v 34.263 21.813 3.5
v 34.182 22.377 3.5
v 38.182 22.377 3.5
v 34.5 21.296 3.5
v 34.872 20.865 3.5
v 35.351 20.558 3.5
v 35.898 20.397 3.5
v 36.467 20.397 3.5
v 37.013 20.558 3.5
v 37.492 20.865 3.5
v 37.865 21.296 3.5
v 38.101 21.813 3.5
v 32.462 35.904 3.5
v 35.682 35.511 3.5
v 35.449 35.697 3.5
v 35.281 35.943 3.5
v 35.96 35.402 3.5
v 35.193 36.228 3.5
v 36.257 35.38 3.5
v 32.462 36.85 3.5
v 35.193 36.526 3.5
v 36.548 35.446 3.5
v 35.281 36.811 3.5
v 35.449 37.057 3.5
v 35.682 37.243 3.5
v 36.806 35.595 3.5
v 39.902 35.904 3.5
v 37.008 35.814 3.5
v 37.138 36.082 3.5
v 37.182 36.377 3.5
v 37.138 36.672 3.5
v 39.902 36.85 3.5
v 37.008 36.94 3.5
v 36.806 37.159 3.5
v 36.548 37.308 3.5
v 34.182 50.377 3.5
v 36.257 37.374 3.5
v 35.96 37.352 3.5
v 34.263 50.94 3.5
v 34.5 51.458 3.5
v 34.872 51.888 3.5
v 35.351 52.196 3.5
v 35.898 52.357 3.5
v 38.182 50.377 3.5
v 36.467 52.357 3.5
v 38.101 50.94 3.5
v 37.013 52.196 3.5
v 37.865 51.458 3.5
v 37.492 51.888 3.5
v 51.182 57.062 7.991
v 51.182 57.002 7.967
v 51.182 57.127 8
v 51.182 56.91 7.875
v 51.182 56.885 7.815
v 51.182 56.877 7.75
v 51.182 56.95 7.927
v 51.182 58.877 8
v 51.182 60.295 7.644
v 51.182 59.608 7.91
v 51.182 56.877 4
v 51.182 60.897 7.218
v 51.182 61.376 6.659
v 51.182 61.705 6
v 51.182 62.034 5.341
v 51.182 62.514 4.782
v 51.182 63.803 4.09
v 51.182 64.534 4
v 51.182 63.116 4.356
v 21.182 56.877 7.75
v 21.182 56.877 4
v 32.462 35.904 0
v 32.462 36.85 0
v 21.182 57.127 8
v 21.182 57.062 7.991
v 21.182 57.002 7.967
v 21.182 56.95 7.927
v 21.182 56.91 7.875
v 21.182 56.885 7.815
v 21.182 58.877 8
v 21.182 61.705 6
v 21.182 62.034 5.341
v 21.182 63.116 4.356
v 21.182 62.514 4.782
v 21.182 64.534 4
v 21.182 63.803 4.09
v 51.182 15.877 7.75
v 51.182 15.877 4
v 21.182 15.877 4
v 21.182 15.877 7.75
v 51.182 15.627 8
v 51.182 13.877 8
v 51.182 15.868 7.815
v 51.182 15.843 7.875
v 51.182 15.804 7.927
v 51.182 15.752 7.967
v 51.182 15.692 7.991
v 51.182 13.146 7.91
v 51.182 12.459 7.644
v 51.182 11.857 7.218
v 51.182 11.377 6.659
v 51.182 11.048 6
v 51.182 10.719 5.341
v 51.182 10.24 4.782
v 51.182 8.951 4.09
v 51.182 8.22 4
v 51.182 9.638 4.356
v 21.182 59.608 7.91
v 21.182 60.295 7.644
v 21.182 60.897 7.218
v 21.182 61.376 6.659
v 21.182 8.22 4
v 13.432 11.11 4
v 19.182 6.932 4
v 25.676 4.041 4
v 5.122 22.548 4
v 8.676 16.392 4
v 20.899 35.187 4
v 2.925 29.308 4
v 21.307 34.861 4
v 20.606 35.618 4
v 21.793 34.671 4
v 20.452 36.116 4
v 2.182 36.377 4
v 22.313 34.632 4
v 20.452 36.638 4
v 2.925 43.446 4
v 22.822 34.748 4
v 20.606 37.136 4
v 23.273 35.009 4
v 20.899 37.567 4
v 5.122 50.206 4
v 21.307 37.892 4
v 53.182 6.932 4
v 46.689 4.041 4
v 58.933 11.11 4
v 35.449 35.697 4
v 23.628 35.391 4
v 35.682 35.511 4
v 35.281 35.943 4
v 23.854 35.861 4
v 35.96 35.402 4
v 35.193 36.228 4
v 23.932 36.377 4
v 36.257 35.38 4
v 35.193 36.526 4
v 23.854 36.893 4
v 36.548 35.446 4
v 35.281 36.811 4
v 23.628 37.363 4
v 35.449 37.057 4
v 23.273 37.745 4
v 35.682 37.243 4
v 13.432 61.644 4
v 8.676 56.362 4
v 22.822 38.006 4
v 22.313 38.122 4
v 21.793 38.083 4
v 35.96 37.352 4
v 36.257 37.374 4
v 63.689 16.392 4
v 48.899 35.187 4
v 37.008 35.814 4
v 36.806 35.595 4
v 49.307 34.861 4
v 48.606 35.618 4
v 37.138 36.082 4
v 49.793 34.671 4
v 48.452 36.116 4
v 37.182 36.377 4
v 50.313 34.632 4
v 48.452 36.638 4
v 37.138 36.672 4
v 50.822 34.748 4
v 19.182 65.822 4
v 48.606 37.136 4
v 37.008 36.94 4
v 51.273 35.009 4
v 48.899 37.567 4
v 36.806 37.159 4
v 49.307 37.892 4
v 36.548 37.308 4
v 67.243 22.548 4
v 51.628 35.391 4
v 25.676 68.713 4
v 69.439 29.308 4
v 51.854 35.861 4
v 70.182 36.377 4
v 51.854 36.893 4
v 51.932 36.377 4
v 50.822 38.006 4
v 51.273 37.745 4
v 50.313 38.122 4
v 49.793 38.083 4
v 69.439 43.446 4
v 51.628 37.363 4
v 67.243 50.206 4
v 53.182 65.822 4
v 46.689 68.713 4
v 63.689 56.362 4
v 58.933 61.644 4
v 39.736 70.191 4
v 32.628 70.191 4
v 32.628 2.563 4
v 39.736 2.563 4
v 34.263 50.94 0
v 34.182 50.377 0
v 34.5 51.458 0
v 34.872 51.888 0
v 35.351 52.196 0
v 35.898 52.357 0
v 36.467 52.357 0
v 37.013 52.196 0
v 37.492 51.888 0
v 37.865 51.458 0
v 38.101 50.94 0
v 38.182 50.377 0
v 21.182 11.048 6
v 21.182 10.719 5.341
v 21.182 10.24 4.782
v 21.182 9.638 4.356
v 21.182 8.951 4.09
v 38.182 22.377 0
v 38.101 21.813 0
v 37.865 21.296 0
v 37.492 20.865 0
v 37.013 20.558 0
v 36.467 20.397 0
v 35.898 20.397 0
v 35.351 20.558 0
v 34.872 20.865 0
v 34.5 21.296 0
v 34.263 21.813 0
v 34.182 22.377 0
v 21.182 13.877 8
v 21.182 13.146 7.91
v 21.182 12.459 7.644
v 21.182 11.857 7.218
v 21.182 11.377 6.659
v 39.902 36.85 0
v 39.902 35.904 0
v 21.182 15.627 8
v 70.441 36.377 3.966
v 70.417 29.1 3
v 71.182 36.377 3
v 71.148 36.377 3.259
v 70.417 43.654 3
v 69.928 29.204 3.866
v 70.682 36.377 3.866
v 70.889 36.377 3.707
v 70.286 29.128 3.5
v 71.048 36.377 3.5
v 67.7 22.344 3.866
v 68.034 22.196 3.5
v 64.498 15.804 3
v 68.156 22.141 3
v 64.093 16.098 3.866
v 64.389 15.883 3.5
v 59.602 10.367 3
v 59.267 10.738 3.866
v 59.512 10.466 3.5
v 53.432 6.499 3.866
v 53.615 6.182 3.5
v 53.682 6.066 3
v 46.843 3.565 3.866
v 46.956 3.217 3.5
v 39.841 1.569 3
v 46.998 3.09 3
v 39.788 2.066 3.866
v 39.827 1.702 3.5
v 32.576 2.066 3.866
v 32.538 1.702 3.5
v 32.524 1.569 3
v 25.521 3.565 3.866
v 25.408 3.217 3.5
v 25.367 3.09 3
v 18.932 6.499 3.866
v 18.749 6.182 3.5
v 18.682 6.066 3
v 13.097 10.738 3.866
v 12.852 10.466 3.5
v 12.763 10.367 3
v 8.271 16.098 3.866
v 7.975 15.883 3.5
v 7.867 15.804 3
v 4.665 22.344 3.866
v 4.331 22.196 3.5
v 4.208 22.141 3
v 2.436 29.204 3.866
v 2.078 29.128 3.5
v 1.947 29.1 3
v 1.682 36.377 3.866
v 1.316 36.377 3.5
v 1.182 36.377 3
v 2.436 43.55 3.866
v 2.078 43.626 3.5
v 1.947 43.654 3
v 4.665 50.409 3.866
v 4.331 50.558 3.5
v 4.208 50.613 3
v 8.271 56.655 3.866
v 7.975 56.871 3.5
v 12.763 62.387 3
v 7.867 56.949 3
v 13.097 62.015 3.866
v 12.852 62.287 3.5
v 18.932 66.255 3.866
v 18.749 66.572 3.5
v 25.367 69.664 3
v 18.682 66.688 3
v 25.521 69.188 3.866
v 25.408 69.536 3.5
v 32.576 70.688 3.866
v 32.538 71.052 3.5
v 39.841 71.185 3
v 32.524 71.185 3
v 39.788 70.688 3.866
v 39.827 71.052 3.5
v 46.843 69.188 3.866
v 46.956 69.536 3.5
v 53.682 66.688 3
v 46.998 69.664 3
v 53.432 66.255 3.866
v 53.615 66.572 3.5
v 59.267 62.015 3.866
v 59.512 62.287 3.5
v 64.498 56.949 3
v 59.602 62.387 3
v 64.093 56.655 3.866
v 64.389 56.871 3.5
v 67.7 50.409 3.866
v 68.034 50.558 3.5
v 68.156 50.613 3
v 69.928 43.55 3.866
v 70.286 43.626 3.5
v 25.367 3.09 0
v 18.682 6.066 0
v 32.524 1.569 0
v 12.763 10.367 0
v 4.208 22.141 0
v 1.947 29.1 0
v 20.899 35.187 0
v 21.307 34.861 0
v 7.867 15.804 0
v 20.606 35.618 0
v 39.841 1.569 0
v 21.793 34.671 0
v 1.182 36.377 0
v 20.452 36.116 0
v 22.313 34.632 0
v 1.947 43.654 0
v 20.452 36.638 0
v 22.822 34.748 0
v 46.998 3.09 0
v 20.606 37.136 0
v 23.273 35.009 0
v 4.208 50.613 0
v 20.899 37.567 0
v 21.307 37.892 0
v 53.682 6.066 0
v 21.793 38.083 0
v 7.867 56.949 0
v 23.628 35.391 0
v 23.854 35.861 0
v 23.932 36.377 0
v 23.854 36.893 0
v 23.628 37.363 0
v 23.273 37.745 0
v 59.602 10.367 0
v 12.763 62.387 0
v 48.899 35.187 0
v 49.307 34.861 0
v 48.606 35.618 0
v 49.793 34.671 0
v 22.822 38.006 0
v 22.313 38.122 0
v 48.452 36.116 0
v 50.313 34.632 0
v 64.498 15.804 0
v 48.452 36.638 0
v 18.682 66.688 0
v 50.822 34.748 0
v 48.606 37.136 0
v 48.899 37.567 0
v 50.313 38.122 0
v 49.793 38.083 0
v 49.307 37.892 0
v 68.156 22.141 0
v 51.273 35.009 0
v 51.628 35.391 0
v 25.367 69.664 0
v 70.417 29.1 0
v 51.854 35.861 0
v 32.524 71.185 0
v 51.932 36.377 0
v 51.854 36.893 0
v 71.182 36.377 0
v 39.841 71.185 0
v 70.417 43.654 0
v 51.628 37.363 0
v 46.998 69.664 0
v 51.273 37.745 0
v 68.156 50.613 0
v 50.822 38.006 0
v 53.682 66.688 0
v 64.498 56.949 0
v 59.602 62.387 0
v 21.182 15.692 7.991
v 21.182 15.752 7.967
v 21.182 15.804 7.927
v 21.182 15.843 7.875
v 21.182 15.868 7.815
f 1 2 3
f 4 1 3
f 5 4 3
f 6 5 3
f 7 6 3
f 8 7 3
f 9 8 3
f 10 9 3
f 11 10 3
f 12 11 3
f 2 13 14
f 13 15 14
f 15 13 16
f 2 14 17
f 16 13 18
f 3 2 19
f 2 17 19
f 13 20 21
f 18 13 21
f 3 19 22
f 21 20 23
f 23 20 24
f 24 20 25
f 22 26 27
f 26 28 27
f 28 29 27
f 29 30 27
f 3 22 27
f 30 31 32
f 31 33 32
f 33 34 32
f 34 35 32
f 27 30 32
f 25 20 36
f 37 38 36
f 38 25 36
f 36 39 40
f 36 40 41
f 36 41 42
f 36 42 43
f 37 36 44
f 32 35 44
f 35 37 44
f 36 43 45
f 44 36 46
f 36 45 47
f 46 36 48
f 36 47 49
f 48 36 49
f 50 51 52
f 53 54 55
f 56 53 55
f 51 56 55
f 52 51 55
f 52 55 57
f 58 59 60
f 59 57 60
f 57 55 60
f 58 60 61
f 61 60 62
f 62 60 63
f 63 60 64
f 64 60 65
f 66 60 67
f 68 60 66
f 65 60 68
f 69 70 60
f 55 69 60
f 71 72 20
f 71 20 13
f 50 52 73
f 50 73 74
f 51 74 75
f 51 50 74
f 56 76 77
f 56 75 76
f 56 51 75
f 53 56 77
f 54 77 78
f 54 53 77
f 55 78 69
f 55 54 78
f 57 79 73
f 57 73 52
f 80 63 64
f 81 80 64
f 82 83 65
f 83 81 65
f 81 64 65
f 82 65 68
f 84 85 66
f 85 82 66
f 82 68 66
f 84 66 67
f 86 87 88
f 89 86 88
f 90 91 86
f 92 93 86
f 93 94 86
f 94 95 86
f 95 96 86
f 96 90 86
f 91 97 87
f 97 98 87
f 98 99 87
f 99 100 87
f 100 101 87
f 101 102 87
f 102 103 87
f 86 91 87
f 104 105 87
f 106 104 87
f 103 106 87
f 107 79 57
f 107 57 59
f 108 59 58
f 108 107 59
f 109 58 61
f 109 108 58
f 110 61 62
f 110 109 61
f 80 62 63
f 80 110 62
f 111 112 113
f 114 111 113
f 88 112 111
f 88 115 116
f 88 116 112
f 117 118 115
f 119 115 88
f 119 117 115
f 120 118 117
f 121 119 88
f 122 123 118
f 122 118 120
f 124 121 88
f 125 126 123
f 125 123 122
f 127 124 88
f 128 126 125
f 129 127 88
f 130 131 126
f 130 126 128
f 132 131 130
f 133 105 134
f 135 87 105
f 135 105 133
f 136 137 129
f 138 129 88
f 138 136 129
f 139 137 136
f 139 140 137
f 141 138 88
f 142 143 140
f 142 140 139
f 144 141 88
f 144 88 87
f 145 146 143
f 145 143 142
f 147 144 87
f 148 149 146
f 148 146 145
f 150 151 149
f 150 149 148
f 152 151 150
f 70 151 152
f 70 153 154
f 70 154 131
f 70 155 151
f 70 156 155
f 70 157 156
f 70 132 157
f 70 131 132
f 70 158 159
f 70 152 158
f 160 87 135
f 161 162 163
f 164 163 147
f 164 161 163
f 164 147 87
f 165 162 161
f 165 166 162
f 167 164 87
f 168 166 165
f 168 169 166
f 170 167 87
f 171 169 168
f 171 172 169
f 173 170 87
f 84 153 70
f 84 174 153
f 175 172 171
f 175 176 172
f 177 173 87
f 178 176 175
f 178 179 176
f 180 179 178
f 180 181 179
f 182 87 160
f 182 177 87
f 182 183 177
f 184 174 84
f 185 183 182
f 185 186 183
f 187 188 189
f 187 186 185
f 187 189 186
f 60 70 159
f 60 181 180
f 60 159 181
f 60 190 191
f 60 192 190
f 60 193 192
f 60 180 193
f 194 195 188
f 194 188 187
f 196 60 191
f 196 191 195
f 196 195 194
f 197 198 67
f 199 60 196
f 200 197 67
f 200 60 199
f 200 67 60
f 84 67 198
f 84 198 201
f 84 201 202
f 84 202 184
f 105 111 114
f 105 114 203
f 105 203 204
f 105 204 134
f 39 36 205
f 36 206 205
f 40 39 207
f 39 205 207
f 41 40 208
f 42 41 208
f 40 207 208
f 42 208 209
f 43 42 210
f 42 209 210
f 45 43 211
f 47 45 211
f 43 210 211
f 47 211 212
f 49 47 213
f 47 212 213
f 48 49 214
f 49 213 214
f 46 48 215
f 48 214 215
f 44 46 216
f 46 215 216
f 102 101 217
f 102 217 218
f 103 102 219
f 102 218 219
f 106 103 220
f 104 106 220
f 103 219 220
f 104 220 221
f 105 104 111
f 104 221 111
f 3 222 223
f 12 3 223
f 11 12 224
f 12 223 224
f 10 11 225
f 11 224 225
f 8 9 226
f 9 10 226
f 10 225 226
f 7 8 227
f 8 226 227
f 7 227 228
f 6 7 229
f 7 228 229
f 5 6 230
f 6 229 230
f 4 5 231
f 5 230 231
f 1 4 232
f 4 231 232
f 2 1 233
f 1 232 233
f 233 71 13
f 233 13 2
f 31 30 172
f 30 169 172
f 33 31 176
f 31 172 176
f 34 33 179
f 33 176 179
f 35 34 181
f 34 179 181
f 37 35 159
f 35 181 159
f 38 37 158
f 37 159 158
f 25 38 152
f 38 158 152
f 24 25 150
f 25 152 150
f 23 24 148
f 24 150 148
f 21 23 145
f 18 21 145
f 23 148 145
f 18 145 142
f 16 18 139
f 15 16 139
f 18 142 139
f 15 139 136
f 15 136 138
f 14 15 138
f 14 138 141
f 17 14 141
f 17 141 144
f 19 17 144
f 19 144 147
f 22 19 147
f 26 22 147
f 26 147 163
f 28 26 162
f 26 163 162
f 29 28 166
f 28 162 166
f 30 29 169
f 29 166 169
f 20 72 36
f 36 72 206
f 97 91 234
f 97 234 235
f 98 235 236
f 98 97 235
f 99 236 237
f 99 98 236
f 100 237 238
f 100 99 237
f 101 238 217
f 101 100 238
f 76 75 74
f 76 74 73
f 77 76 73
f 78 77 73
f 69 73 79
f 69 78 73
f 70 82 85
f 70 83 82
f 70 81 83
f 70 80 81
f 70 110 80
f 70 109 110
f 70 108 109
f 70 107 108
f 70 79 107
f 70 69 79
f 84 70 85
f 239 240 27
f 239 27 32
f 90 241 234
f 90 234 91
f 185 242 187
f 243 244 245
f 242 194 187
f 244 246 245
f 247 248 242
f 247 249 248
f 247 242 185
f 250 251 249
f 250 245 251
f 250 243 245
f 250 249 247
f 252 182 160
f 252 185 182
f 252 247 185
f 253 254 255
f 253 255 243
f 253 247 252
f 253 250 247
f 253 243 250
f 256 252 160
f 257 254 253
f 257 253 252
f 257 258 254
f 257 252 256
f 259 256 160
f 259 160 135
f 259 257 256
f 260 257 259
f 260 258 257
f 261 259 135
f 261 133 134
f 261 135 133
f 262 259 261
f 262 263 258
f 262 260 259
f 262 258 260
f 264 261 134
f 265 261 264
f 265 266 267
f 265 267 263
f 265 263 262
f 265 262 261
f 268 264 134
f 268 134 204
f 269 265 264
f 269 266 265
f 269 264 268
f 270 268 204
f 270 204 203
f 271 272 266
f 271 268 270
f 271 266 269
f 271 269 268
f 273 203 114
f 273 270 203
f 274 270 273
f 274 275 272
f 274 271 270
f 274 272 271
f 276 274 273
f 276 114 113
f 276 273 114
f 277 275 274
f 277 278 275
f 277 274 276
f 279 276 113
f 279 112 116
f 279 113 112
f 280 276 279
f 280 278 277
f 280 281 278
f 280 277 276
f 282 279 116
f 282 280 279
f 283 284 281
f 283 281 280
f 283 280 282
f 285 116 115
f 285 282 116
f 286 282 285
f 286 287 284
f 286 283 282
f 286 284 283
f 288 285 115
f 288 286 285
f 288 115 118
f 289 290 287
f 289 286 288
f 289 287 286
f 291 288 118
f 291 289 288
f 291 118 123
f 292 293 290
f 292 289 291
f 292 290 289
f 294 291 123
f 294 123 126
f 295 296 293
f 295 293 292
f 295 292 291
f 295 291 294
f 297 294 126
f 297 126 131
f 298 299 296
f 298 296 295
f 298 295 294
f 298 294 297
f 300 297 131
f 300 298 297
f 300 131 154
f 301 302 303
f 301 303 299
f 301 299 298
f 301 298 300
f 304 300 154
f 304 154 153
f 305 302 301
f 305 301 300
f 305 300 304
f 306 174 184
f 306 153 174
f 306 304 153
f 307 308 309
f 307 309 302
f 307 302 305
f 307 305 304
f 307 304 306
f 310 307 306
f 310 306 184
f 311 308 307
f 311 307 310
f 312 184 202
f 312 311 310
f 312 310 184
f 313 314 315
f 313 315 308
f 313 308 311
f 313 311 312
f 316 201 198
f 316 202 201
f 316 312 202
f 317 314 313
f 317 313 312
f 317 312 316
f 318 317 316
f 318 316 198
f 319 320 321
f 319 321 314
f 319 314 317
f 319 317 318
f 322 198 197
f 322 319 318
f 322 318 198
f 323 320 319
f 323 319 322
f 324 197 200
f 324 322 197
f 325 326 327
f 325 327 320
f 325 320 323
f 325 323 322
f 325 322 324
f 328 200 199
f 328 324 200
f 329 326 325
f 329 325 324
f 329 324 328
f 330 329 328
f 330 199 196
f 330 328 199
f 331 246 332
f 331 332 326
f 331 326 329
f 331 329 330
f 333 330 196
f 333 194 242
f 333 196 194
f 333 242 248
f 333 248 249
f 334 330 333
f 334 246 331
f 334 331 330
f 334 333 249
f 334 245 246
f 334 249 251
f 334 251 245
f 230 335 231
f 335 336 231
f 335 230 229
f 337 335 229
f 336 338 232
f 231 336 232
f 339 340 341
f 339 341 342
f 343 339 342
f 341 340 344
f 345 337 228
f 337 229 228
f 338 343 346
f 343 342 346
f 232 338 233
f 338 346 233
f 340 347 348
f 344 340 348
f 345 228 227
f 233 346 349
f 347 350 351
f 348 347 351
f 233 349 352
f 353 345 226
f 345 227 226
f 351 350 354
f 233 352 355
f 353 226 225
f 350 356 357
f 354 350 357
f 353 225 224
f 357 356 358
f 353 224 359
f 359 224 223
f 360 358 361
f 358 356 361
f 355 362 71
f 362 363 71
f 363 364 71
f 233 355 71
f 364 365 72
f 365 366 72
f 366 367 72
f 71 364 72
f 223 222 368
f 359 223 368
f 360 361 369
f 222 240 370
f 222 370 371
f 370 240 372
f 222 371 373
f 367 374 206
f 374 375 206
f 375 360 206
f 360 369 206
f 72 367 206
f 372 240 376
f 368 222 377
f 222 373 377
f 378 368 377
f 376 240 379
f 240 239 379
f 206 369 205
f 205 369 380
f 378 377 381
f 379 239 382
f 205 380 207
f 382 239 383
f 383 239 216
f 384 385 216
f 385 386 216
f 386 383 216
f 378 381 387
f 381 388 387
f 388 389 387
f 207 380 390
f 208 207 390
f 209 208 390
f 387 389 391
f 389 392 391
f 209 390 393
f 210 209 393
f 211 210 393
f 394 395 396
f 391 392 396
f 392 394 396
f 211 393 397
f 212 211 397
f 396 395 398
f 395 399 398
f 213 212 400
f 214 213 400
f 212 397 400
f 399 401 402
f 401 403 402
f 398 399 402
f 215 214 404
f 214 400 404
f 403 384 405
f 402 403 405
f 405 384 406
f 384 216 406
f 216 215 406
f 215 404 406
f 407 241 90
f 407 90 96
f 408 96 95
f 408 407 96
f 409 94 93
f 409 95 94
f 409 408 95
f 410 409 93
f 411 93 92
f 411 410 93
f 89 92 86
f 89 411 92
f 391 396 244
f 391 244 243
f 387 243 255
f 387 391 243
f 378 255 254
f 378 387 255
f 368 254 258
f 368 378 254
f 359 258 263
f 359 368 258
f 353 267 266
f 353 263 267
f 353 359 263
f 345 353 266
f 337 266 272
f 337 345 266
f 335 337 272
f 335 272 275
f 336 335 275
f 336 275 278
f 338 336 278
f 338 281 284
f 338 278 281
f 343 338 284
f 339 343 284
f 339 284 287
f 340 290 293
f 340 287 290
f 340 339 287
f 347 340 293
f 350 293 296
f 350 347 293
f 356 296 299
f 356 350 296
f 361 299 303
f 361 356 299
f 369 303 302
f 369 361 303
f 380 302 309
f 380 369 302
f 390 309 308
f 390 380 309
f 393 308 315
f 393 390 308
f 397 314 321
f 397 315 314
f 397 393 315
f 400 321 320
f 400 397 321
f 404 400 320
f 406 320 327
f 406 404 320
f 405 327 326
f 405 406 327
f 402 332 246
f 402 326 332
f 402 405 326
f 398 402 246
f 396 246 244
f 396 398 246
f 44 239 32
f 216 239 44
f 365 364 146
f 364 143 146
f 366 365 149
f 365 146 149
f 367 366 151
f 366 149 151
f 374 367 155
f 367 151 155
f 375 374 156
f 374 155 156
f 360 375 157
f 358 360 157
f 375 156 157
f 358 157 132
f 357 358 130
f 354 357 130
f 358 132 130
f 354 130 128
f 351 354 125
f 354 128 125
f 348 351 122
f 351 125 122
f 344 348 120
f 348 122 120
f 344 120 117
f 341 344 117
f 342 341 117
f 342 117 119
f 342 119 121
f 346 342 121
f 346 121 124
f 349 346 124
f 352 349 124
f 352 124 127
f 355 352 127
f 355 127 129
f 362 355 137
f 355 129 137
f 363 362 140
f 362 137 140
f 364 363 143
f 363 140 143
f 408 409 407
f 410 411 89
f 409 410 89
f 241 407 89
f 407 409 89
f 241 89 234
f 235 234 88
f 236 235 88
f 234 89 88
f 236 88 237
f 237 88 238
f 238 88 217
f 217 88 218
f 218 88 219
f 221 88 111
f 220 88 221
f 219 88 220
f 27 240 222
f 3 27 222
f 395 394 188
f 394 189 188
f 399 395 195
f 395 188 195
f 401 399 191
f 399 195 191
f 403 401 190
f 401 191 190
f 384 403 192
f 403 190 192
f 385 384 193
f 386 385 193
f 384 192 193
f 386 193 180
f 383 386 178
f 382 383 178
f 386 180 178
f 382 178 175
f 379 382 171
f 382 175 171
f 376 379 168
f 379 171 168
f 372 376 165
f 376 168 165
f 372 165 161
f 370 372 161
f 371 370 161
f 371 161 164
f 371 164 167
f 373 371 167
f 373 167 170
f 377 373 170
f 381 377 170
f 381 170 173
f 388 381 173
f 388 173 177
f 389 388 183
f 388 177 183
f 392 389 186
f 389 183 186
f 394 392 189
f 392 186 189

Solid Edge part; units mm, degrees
sketch "Sketch1" plane through (0, 0, 0) normal (0, 0, 1) x (1, 0, 0)
  circle A0 centre (36.1822, 36.3769) radius 35
  circle A1 centre (36.1822, 36.3769) radius 35
extrude "Protrusion1" add sketch "Sketch1" along normal blind 4
sketch "Sketch2" plane through (36.1822, 36.3769, 4) normal (0, 0, 1) x (1, 0, 0)
  circle A0 centre (14, 0) radius 1.75
  circle A1 centre (-14, 0) radius 1.75
  circle A2 centre (0, 0) radius 1
  dimension "D1" = 14
  dimension "D2" = 14
  dimension "D3" = 3.5
  dimension "D4" = 2
extrude "Cutout1" cut sketch "Sketch2" against normal through all
sketch "Sketch3" plane through (36.1822, 36.3769, 0) normal (0, 0, -1) x (0, -1, 0)
  line L0 (0.473, 3.72) -> (14, 2)
  arc A0 (14, 2) -> (14, -2) centre (14, 0) cw
  line L1 (0.473, -3.72) -> (14, -2)
  line L2 (0.473, -3.72) -> (-0.473, -3.72)
  line L3 (-0.473, -3.72) -> (-14, -2)
  arc A1 (-14, 2) -> (-14, -2) centre (-14, 0) ccw
  line L4 (-0.473, 3.72) -> (-14, 2)
  line L5 (-0.473, 3.72) -> (0.473, 3.72)
  dimension "D1" = 7.5
  dimension "D2" = 2
  dimension "D3" = 14
extrude "Enlèvement_matière_2" cut sketch "Sketch3" against normal blind 3.5
sketch "Sketch4" plane through (36.1822, 36.3769, 4) normal (0, 0, 1) x (0, 1, 0)
  line L0 (20.5, -15) -> (25.5, -15)
  line L1 (25.5, -15) -> (25.5, 15)
  line L2 (25.5, 15) -> (20.5, 15)
  line L3 (20.5, 15) -> (20.5, -15)
  line L4 (-25.5, -15) -> (-20.5, -15)
  line L5 (-20.5, -15) -> (-20.5, 15)
  line L6 (-20.5, 15) -> (-25.5, 15)
  line L7 (-25.5, 15) -> (-25.5, -15)
  dimension "D1" = 41
  dimension "D2" = 5
  dimension "D3" = 30
  dimension "D4" = 20.5
  dimension "D5" = 20.5
  dimension "D6" = 15
extrude "Ajout_matière_2" add sketch "Sketch4" along normal blind 4
fillet "Congé_1" radius 0.25 2 edges at (36.1822, 56.8769, 8) (36.1822, 15.8769, 8)
fillet "Congé_2" radius 3 2 edges at (36.1822, 61.8769, 8) (36.1822, 10.8769, 8)
fillet "Congé_3" radius 3 2 edges at (36.1822, 61.8769, 4) (36.1822, 10.8769, 4)
fillet "Congé_4" radius 1 1 edges at (1.1822, 36.3769, 4)
properties part number "AC_1.02"
